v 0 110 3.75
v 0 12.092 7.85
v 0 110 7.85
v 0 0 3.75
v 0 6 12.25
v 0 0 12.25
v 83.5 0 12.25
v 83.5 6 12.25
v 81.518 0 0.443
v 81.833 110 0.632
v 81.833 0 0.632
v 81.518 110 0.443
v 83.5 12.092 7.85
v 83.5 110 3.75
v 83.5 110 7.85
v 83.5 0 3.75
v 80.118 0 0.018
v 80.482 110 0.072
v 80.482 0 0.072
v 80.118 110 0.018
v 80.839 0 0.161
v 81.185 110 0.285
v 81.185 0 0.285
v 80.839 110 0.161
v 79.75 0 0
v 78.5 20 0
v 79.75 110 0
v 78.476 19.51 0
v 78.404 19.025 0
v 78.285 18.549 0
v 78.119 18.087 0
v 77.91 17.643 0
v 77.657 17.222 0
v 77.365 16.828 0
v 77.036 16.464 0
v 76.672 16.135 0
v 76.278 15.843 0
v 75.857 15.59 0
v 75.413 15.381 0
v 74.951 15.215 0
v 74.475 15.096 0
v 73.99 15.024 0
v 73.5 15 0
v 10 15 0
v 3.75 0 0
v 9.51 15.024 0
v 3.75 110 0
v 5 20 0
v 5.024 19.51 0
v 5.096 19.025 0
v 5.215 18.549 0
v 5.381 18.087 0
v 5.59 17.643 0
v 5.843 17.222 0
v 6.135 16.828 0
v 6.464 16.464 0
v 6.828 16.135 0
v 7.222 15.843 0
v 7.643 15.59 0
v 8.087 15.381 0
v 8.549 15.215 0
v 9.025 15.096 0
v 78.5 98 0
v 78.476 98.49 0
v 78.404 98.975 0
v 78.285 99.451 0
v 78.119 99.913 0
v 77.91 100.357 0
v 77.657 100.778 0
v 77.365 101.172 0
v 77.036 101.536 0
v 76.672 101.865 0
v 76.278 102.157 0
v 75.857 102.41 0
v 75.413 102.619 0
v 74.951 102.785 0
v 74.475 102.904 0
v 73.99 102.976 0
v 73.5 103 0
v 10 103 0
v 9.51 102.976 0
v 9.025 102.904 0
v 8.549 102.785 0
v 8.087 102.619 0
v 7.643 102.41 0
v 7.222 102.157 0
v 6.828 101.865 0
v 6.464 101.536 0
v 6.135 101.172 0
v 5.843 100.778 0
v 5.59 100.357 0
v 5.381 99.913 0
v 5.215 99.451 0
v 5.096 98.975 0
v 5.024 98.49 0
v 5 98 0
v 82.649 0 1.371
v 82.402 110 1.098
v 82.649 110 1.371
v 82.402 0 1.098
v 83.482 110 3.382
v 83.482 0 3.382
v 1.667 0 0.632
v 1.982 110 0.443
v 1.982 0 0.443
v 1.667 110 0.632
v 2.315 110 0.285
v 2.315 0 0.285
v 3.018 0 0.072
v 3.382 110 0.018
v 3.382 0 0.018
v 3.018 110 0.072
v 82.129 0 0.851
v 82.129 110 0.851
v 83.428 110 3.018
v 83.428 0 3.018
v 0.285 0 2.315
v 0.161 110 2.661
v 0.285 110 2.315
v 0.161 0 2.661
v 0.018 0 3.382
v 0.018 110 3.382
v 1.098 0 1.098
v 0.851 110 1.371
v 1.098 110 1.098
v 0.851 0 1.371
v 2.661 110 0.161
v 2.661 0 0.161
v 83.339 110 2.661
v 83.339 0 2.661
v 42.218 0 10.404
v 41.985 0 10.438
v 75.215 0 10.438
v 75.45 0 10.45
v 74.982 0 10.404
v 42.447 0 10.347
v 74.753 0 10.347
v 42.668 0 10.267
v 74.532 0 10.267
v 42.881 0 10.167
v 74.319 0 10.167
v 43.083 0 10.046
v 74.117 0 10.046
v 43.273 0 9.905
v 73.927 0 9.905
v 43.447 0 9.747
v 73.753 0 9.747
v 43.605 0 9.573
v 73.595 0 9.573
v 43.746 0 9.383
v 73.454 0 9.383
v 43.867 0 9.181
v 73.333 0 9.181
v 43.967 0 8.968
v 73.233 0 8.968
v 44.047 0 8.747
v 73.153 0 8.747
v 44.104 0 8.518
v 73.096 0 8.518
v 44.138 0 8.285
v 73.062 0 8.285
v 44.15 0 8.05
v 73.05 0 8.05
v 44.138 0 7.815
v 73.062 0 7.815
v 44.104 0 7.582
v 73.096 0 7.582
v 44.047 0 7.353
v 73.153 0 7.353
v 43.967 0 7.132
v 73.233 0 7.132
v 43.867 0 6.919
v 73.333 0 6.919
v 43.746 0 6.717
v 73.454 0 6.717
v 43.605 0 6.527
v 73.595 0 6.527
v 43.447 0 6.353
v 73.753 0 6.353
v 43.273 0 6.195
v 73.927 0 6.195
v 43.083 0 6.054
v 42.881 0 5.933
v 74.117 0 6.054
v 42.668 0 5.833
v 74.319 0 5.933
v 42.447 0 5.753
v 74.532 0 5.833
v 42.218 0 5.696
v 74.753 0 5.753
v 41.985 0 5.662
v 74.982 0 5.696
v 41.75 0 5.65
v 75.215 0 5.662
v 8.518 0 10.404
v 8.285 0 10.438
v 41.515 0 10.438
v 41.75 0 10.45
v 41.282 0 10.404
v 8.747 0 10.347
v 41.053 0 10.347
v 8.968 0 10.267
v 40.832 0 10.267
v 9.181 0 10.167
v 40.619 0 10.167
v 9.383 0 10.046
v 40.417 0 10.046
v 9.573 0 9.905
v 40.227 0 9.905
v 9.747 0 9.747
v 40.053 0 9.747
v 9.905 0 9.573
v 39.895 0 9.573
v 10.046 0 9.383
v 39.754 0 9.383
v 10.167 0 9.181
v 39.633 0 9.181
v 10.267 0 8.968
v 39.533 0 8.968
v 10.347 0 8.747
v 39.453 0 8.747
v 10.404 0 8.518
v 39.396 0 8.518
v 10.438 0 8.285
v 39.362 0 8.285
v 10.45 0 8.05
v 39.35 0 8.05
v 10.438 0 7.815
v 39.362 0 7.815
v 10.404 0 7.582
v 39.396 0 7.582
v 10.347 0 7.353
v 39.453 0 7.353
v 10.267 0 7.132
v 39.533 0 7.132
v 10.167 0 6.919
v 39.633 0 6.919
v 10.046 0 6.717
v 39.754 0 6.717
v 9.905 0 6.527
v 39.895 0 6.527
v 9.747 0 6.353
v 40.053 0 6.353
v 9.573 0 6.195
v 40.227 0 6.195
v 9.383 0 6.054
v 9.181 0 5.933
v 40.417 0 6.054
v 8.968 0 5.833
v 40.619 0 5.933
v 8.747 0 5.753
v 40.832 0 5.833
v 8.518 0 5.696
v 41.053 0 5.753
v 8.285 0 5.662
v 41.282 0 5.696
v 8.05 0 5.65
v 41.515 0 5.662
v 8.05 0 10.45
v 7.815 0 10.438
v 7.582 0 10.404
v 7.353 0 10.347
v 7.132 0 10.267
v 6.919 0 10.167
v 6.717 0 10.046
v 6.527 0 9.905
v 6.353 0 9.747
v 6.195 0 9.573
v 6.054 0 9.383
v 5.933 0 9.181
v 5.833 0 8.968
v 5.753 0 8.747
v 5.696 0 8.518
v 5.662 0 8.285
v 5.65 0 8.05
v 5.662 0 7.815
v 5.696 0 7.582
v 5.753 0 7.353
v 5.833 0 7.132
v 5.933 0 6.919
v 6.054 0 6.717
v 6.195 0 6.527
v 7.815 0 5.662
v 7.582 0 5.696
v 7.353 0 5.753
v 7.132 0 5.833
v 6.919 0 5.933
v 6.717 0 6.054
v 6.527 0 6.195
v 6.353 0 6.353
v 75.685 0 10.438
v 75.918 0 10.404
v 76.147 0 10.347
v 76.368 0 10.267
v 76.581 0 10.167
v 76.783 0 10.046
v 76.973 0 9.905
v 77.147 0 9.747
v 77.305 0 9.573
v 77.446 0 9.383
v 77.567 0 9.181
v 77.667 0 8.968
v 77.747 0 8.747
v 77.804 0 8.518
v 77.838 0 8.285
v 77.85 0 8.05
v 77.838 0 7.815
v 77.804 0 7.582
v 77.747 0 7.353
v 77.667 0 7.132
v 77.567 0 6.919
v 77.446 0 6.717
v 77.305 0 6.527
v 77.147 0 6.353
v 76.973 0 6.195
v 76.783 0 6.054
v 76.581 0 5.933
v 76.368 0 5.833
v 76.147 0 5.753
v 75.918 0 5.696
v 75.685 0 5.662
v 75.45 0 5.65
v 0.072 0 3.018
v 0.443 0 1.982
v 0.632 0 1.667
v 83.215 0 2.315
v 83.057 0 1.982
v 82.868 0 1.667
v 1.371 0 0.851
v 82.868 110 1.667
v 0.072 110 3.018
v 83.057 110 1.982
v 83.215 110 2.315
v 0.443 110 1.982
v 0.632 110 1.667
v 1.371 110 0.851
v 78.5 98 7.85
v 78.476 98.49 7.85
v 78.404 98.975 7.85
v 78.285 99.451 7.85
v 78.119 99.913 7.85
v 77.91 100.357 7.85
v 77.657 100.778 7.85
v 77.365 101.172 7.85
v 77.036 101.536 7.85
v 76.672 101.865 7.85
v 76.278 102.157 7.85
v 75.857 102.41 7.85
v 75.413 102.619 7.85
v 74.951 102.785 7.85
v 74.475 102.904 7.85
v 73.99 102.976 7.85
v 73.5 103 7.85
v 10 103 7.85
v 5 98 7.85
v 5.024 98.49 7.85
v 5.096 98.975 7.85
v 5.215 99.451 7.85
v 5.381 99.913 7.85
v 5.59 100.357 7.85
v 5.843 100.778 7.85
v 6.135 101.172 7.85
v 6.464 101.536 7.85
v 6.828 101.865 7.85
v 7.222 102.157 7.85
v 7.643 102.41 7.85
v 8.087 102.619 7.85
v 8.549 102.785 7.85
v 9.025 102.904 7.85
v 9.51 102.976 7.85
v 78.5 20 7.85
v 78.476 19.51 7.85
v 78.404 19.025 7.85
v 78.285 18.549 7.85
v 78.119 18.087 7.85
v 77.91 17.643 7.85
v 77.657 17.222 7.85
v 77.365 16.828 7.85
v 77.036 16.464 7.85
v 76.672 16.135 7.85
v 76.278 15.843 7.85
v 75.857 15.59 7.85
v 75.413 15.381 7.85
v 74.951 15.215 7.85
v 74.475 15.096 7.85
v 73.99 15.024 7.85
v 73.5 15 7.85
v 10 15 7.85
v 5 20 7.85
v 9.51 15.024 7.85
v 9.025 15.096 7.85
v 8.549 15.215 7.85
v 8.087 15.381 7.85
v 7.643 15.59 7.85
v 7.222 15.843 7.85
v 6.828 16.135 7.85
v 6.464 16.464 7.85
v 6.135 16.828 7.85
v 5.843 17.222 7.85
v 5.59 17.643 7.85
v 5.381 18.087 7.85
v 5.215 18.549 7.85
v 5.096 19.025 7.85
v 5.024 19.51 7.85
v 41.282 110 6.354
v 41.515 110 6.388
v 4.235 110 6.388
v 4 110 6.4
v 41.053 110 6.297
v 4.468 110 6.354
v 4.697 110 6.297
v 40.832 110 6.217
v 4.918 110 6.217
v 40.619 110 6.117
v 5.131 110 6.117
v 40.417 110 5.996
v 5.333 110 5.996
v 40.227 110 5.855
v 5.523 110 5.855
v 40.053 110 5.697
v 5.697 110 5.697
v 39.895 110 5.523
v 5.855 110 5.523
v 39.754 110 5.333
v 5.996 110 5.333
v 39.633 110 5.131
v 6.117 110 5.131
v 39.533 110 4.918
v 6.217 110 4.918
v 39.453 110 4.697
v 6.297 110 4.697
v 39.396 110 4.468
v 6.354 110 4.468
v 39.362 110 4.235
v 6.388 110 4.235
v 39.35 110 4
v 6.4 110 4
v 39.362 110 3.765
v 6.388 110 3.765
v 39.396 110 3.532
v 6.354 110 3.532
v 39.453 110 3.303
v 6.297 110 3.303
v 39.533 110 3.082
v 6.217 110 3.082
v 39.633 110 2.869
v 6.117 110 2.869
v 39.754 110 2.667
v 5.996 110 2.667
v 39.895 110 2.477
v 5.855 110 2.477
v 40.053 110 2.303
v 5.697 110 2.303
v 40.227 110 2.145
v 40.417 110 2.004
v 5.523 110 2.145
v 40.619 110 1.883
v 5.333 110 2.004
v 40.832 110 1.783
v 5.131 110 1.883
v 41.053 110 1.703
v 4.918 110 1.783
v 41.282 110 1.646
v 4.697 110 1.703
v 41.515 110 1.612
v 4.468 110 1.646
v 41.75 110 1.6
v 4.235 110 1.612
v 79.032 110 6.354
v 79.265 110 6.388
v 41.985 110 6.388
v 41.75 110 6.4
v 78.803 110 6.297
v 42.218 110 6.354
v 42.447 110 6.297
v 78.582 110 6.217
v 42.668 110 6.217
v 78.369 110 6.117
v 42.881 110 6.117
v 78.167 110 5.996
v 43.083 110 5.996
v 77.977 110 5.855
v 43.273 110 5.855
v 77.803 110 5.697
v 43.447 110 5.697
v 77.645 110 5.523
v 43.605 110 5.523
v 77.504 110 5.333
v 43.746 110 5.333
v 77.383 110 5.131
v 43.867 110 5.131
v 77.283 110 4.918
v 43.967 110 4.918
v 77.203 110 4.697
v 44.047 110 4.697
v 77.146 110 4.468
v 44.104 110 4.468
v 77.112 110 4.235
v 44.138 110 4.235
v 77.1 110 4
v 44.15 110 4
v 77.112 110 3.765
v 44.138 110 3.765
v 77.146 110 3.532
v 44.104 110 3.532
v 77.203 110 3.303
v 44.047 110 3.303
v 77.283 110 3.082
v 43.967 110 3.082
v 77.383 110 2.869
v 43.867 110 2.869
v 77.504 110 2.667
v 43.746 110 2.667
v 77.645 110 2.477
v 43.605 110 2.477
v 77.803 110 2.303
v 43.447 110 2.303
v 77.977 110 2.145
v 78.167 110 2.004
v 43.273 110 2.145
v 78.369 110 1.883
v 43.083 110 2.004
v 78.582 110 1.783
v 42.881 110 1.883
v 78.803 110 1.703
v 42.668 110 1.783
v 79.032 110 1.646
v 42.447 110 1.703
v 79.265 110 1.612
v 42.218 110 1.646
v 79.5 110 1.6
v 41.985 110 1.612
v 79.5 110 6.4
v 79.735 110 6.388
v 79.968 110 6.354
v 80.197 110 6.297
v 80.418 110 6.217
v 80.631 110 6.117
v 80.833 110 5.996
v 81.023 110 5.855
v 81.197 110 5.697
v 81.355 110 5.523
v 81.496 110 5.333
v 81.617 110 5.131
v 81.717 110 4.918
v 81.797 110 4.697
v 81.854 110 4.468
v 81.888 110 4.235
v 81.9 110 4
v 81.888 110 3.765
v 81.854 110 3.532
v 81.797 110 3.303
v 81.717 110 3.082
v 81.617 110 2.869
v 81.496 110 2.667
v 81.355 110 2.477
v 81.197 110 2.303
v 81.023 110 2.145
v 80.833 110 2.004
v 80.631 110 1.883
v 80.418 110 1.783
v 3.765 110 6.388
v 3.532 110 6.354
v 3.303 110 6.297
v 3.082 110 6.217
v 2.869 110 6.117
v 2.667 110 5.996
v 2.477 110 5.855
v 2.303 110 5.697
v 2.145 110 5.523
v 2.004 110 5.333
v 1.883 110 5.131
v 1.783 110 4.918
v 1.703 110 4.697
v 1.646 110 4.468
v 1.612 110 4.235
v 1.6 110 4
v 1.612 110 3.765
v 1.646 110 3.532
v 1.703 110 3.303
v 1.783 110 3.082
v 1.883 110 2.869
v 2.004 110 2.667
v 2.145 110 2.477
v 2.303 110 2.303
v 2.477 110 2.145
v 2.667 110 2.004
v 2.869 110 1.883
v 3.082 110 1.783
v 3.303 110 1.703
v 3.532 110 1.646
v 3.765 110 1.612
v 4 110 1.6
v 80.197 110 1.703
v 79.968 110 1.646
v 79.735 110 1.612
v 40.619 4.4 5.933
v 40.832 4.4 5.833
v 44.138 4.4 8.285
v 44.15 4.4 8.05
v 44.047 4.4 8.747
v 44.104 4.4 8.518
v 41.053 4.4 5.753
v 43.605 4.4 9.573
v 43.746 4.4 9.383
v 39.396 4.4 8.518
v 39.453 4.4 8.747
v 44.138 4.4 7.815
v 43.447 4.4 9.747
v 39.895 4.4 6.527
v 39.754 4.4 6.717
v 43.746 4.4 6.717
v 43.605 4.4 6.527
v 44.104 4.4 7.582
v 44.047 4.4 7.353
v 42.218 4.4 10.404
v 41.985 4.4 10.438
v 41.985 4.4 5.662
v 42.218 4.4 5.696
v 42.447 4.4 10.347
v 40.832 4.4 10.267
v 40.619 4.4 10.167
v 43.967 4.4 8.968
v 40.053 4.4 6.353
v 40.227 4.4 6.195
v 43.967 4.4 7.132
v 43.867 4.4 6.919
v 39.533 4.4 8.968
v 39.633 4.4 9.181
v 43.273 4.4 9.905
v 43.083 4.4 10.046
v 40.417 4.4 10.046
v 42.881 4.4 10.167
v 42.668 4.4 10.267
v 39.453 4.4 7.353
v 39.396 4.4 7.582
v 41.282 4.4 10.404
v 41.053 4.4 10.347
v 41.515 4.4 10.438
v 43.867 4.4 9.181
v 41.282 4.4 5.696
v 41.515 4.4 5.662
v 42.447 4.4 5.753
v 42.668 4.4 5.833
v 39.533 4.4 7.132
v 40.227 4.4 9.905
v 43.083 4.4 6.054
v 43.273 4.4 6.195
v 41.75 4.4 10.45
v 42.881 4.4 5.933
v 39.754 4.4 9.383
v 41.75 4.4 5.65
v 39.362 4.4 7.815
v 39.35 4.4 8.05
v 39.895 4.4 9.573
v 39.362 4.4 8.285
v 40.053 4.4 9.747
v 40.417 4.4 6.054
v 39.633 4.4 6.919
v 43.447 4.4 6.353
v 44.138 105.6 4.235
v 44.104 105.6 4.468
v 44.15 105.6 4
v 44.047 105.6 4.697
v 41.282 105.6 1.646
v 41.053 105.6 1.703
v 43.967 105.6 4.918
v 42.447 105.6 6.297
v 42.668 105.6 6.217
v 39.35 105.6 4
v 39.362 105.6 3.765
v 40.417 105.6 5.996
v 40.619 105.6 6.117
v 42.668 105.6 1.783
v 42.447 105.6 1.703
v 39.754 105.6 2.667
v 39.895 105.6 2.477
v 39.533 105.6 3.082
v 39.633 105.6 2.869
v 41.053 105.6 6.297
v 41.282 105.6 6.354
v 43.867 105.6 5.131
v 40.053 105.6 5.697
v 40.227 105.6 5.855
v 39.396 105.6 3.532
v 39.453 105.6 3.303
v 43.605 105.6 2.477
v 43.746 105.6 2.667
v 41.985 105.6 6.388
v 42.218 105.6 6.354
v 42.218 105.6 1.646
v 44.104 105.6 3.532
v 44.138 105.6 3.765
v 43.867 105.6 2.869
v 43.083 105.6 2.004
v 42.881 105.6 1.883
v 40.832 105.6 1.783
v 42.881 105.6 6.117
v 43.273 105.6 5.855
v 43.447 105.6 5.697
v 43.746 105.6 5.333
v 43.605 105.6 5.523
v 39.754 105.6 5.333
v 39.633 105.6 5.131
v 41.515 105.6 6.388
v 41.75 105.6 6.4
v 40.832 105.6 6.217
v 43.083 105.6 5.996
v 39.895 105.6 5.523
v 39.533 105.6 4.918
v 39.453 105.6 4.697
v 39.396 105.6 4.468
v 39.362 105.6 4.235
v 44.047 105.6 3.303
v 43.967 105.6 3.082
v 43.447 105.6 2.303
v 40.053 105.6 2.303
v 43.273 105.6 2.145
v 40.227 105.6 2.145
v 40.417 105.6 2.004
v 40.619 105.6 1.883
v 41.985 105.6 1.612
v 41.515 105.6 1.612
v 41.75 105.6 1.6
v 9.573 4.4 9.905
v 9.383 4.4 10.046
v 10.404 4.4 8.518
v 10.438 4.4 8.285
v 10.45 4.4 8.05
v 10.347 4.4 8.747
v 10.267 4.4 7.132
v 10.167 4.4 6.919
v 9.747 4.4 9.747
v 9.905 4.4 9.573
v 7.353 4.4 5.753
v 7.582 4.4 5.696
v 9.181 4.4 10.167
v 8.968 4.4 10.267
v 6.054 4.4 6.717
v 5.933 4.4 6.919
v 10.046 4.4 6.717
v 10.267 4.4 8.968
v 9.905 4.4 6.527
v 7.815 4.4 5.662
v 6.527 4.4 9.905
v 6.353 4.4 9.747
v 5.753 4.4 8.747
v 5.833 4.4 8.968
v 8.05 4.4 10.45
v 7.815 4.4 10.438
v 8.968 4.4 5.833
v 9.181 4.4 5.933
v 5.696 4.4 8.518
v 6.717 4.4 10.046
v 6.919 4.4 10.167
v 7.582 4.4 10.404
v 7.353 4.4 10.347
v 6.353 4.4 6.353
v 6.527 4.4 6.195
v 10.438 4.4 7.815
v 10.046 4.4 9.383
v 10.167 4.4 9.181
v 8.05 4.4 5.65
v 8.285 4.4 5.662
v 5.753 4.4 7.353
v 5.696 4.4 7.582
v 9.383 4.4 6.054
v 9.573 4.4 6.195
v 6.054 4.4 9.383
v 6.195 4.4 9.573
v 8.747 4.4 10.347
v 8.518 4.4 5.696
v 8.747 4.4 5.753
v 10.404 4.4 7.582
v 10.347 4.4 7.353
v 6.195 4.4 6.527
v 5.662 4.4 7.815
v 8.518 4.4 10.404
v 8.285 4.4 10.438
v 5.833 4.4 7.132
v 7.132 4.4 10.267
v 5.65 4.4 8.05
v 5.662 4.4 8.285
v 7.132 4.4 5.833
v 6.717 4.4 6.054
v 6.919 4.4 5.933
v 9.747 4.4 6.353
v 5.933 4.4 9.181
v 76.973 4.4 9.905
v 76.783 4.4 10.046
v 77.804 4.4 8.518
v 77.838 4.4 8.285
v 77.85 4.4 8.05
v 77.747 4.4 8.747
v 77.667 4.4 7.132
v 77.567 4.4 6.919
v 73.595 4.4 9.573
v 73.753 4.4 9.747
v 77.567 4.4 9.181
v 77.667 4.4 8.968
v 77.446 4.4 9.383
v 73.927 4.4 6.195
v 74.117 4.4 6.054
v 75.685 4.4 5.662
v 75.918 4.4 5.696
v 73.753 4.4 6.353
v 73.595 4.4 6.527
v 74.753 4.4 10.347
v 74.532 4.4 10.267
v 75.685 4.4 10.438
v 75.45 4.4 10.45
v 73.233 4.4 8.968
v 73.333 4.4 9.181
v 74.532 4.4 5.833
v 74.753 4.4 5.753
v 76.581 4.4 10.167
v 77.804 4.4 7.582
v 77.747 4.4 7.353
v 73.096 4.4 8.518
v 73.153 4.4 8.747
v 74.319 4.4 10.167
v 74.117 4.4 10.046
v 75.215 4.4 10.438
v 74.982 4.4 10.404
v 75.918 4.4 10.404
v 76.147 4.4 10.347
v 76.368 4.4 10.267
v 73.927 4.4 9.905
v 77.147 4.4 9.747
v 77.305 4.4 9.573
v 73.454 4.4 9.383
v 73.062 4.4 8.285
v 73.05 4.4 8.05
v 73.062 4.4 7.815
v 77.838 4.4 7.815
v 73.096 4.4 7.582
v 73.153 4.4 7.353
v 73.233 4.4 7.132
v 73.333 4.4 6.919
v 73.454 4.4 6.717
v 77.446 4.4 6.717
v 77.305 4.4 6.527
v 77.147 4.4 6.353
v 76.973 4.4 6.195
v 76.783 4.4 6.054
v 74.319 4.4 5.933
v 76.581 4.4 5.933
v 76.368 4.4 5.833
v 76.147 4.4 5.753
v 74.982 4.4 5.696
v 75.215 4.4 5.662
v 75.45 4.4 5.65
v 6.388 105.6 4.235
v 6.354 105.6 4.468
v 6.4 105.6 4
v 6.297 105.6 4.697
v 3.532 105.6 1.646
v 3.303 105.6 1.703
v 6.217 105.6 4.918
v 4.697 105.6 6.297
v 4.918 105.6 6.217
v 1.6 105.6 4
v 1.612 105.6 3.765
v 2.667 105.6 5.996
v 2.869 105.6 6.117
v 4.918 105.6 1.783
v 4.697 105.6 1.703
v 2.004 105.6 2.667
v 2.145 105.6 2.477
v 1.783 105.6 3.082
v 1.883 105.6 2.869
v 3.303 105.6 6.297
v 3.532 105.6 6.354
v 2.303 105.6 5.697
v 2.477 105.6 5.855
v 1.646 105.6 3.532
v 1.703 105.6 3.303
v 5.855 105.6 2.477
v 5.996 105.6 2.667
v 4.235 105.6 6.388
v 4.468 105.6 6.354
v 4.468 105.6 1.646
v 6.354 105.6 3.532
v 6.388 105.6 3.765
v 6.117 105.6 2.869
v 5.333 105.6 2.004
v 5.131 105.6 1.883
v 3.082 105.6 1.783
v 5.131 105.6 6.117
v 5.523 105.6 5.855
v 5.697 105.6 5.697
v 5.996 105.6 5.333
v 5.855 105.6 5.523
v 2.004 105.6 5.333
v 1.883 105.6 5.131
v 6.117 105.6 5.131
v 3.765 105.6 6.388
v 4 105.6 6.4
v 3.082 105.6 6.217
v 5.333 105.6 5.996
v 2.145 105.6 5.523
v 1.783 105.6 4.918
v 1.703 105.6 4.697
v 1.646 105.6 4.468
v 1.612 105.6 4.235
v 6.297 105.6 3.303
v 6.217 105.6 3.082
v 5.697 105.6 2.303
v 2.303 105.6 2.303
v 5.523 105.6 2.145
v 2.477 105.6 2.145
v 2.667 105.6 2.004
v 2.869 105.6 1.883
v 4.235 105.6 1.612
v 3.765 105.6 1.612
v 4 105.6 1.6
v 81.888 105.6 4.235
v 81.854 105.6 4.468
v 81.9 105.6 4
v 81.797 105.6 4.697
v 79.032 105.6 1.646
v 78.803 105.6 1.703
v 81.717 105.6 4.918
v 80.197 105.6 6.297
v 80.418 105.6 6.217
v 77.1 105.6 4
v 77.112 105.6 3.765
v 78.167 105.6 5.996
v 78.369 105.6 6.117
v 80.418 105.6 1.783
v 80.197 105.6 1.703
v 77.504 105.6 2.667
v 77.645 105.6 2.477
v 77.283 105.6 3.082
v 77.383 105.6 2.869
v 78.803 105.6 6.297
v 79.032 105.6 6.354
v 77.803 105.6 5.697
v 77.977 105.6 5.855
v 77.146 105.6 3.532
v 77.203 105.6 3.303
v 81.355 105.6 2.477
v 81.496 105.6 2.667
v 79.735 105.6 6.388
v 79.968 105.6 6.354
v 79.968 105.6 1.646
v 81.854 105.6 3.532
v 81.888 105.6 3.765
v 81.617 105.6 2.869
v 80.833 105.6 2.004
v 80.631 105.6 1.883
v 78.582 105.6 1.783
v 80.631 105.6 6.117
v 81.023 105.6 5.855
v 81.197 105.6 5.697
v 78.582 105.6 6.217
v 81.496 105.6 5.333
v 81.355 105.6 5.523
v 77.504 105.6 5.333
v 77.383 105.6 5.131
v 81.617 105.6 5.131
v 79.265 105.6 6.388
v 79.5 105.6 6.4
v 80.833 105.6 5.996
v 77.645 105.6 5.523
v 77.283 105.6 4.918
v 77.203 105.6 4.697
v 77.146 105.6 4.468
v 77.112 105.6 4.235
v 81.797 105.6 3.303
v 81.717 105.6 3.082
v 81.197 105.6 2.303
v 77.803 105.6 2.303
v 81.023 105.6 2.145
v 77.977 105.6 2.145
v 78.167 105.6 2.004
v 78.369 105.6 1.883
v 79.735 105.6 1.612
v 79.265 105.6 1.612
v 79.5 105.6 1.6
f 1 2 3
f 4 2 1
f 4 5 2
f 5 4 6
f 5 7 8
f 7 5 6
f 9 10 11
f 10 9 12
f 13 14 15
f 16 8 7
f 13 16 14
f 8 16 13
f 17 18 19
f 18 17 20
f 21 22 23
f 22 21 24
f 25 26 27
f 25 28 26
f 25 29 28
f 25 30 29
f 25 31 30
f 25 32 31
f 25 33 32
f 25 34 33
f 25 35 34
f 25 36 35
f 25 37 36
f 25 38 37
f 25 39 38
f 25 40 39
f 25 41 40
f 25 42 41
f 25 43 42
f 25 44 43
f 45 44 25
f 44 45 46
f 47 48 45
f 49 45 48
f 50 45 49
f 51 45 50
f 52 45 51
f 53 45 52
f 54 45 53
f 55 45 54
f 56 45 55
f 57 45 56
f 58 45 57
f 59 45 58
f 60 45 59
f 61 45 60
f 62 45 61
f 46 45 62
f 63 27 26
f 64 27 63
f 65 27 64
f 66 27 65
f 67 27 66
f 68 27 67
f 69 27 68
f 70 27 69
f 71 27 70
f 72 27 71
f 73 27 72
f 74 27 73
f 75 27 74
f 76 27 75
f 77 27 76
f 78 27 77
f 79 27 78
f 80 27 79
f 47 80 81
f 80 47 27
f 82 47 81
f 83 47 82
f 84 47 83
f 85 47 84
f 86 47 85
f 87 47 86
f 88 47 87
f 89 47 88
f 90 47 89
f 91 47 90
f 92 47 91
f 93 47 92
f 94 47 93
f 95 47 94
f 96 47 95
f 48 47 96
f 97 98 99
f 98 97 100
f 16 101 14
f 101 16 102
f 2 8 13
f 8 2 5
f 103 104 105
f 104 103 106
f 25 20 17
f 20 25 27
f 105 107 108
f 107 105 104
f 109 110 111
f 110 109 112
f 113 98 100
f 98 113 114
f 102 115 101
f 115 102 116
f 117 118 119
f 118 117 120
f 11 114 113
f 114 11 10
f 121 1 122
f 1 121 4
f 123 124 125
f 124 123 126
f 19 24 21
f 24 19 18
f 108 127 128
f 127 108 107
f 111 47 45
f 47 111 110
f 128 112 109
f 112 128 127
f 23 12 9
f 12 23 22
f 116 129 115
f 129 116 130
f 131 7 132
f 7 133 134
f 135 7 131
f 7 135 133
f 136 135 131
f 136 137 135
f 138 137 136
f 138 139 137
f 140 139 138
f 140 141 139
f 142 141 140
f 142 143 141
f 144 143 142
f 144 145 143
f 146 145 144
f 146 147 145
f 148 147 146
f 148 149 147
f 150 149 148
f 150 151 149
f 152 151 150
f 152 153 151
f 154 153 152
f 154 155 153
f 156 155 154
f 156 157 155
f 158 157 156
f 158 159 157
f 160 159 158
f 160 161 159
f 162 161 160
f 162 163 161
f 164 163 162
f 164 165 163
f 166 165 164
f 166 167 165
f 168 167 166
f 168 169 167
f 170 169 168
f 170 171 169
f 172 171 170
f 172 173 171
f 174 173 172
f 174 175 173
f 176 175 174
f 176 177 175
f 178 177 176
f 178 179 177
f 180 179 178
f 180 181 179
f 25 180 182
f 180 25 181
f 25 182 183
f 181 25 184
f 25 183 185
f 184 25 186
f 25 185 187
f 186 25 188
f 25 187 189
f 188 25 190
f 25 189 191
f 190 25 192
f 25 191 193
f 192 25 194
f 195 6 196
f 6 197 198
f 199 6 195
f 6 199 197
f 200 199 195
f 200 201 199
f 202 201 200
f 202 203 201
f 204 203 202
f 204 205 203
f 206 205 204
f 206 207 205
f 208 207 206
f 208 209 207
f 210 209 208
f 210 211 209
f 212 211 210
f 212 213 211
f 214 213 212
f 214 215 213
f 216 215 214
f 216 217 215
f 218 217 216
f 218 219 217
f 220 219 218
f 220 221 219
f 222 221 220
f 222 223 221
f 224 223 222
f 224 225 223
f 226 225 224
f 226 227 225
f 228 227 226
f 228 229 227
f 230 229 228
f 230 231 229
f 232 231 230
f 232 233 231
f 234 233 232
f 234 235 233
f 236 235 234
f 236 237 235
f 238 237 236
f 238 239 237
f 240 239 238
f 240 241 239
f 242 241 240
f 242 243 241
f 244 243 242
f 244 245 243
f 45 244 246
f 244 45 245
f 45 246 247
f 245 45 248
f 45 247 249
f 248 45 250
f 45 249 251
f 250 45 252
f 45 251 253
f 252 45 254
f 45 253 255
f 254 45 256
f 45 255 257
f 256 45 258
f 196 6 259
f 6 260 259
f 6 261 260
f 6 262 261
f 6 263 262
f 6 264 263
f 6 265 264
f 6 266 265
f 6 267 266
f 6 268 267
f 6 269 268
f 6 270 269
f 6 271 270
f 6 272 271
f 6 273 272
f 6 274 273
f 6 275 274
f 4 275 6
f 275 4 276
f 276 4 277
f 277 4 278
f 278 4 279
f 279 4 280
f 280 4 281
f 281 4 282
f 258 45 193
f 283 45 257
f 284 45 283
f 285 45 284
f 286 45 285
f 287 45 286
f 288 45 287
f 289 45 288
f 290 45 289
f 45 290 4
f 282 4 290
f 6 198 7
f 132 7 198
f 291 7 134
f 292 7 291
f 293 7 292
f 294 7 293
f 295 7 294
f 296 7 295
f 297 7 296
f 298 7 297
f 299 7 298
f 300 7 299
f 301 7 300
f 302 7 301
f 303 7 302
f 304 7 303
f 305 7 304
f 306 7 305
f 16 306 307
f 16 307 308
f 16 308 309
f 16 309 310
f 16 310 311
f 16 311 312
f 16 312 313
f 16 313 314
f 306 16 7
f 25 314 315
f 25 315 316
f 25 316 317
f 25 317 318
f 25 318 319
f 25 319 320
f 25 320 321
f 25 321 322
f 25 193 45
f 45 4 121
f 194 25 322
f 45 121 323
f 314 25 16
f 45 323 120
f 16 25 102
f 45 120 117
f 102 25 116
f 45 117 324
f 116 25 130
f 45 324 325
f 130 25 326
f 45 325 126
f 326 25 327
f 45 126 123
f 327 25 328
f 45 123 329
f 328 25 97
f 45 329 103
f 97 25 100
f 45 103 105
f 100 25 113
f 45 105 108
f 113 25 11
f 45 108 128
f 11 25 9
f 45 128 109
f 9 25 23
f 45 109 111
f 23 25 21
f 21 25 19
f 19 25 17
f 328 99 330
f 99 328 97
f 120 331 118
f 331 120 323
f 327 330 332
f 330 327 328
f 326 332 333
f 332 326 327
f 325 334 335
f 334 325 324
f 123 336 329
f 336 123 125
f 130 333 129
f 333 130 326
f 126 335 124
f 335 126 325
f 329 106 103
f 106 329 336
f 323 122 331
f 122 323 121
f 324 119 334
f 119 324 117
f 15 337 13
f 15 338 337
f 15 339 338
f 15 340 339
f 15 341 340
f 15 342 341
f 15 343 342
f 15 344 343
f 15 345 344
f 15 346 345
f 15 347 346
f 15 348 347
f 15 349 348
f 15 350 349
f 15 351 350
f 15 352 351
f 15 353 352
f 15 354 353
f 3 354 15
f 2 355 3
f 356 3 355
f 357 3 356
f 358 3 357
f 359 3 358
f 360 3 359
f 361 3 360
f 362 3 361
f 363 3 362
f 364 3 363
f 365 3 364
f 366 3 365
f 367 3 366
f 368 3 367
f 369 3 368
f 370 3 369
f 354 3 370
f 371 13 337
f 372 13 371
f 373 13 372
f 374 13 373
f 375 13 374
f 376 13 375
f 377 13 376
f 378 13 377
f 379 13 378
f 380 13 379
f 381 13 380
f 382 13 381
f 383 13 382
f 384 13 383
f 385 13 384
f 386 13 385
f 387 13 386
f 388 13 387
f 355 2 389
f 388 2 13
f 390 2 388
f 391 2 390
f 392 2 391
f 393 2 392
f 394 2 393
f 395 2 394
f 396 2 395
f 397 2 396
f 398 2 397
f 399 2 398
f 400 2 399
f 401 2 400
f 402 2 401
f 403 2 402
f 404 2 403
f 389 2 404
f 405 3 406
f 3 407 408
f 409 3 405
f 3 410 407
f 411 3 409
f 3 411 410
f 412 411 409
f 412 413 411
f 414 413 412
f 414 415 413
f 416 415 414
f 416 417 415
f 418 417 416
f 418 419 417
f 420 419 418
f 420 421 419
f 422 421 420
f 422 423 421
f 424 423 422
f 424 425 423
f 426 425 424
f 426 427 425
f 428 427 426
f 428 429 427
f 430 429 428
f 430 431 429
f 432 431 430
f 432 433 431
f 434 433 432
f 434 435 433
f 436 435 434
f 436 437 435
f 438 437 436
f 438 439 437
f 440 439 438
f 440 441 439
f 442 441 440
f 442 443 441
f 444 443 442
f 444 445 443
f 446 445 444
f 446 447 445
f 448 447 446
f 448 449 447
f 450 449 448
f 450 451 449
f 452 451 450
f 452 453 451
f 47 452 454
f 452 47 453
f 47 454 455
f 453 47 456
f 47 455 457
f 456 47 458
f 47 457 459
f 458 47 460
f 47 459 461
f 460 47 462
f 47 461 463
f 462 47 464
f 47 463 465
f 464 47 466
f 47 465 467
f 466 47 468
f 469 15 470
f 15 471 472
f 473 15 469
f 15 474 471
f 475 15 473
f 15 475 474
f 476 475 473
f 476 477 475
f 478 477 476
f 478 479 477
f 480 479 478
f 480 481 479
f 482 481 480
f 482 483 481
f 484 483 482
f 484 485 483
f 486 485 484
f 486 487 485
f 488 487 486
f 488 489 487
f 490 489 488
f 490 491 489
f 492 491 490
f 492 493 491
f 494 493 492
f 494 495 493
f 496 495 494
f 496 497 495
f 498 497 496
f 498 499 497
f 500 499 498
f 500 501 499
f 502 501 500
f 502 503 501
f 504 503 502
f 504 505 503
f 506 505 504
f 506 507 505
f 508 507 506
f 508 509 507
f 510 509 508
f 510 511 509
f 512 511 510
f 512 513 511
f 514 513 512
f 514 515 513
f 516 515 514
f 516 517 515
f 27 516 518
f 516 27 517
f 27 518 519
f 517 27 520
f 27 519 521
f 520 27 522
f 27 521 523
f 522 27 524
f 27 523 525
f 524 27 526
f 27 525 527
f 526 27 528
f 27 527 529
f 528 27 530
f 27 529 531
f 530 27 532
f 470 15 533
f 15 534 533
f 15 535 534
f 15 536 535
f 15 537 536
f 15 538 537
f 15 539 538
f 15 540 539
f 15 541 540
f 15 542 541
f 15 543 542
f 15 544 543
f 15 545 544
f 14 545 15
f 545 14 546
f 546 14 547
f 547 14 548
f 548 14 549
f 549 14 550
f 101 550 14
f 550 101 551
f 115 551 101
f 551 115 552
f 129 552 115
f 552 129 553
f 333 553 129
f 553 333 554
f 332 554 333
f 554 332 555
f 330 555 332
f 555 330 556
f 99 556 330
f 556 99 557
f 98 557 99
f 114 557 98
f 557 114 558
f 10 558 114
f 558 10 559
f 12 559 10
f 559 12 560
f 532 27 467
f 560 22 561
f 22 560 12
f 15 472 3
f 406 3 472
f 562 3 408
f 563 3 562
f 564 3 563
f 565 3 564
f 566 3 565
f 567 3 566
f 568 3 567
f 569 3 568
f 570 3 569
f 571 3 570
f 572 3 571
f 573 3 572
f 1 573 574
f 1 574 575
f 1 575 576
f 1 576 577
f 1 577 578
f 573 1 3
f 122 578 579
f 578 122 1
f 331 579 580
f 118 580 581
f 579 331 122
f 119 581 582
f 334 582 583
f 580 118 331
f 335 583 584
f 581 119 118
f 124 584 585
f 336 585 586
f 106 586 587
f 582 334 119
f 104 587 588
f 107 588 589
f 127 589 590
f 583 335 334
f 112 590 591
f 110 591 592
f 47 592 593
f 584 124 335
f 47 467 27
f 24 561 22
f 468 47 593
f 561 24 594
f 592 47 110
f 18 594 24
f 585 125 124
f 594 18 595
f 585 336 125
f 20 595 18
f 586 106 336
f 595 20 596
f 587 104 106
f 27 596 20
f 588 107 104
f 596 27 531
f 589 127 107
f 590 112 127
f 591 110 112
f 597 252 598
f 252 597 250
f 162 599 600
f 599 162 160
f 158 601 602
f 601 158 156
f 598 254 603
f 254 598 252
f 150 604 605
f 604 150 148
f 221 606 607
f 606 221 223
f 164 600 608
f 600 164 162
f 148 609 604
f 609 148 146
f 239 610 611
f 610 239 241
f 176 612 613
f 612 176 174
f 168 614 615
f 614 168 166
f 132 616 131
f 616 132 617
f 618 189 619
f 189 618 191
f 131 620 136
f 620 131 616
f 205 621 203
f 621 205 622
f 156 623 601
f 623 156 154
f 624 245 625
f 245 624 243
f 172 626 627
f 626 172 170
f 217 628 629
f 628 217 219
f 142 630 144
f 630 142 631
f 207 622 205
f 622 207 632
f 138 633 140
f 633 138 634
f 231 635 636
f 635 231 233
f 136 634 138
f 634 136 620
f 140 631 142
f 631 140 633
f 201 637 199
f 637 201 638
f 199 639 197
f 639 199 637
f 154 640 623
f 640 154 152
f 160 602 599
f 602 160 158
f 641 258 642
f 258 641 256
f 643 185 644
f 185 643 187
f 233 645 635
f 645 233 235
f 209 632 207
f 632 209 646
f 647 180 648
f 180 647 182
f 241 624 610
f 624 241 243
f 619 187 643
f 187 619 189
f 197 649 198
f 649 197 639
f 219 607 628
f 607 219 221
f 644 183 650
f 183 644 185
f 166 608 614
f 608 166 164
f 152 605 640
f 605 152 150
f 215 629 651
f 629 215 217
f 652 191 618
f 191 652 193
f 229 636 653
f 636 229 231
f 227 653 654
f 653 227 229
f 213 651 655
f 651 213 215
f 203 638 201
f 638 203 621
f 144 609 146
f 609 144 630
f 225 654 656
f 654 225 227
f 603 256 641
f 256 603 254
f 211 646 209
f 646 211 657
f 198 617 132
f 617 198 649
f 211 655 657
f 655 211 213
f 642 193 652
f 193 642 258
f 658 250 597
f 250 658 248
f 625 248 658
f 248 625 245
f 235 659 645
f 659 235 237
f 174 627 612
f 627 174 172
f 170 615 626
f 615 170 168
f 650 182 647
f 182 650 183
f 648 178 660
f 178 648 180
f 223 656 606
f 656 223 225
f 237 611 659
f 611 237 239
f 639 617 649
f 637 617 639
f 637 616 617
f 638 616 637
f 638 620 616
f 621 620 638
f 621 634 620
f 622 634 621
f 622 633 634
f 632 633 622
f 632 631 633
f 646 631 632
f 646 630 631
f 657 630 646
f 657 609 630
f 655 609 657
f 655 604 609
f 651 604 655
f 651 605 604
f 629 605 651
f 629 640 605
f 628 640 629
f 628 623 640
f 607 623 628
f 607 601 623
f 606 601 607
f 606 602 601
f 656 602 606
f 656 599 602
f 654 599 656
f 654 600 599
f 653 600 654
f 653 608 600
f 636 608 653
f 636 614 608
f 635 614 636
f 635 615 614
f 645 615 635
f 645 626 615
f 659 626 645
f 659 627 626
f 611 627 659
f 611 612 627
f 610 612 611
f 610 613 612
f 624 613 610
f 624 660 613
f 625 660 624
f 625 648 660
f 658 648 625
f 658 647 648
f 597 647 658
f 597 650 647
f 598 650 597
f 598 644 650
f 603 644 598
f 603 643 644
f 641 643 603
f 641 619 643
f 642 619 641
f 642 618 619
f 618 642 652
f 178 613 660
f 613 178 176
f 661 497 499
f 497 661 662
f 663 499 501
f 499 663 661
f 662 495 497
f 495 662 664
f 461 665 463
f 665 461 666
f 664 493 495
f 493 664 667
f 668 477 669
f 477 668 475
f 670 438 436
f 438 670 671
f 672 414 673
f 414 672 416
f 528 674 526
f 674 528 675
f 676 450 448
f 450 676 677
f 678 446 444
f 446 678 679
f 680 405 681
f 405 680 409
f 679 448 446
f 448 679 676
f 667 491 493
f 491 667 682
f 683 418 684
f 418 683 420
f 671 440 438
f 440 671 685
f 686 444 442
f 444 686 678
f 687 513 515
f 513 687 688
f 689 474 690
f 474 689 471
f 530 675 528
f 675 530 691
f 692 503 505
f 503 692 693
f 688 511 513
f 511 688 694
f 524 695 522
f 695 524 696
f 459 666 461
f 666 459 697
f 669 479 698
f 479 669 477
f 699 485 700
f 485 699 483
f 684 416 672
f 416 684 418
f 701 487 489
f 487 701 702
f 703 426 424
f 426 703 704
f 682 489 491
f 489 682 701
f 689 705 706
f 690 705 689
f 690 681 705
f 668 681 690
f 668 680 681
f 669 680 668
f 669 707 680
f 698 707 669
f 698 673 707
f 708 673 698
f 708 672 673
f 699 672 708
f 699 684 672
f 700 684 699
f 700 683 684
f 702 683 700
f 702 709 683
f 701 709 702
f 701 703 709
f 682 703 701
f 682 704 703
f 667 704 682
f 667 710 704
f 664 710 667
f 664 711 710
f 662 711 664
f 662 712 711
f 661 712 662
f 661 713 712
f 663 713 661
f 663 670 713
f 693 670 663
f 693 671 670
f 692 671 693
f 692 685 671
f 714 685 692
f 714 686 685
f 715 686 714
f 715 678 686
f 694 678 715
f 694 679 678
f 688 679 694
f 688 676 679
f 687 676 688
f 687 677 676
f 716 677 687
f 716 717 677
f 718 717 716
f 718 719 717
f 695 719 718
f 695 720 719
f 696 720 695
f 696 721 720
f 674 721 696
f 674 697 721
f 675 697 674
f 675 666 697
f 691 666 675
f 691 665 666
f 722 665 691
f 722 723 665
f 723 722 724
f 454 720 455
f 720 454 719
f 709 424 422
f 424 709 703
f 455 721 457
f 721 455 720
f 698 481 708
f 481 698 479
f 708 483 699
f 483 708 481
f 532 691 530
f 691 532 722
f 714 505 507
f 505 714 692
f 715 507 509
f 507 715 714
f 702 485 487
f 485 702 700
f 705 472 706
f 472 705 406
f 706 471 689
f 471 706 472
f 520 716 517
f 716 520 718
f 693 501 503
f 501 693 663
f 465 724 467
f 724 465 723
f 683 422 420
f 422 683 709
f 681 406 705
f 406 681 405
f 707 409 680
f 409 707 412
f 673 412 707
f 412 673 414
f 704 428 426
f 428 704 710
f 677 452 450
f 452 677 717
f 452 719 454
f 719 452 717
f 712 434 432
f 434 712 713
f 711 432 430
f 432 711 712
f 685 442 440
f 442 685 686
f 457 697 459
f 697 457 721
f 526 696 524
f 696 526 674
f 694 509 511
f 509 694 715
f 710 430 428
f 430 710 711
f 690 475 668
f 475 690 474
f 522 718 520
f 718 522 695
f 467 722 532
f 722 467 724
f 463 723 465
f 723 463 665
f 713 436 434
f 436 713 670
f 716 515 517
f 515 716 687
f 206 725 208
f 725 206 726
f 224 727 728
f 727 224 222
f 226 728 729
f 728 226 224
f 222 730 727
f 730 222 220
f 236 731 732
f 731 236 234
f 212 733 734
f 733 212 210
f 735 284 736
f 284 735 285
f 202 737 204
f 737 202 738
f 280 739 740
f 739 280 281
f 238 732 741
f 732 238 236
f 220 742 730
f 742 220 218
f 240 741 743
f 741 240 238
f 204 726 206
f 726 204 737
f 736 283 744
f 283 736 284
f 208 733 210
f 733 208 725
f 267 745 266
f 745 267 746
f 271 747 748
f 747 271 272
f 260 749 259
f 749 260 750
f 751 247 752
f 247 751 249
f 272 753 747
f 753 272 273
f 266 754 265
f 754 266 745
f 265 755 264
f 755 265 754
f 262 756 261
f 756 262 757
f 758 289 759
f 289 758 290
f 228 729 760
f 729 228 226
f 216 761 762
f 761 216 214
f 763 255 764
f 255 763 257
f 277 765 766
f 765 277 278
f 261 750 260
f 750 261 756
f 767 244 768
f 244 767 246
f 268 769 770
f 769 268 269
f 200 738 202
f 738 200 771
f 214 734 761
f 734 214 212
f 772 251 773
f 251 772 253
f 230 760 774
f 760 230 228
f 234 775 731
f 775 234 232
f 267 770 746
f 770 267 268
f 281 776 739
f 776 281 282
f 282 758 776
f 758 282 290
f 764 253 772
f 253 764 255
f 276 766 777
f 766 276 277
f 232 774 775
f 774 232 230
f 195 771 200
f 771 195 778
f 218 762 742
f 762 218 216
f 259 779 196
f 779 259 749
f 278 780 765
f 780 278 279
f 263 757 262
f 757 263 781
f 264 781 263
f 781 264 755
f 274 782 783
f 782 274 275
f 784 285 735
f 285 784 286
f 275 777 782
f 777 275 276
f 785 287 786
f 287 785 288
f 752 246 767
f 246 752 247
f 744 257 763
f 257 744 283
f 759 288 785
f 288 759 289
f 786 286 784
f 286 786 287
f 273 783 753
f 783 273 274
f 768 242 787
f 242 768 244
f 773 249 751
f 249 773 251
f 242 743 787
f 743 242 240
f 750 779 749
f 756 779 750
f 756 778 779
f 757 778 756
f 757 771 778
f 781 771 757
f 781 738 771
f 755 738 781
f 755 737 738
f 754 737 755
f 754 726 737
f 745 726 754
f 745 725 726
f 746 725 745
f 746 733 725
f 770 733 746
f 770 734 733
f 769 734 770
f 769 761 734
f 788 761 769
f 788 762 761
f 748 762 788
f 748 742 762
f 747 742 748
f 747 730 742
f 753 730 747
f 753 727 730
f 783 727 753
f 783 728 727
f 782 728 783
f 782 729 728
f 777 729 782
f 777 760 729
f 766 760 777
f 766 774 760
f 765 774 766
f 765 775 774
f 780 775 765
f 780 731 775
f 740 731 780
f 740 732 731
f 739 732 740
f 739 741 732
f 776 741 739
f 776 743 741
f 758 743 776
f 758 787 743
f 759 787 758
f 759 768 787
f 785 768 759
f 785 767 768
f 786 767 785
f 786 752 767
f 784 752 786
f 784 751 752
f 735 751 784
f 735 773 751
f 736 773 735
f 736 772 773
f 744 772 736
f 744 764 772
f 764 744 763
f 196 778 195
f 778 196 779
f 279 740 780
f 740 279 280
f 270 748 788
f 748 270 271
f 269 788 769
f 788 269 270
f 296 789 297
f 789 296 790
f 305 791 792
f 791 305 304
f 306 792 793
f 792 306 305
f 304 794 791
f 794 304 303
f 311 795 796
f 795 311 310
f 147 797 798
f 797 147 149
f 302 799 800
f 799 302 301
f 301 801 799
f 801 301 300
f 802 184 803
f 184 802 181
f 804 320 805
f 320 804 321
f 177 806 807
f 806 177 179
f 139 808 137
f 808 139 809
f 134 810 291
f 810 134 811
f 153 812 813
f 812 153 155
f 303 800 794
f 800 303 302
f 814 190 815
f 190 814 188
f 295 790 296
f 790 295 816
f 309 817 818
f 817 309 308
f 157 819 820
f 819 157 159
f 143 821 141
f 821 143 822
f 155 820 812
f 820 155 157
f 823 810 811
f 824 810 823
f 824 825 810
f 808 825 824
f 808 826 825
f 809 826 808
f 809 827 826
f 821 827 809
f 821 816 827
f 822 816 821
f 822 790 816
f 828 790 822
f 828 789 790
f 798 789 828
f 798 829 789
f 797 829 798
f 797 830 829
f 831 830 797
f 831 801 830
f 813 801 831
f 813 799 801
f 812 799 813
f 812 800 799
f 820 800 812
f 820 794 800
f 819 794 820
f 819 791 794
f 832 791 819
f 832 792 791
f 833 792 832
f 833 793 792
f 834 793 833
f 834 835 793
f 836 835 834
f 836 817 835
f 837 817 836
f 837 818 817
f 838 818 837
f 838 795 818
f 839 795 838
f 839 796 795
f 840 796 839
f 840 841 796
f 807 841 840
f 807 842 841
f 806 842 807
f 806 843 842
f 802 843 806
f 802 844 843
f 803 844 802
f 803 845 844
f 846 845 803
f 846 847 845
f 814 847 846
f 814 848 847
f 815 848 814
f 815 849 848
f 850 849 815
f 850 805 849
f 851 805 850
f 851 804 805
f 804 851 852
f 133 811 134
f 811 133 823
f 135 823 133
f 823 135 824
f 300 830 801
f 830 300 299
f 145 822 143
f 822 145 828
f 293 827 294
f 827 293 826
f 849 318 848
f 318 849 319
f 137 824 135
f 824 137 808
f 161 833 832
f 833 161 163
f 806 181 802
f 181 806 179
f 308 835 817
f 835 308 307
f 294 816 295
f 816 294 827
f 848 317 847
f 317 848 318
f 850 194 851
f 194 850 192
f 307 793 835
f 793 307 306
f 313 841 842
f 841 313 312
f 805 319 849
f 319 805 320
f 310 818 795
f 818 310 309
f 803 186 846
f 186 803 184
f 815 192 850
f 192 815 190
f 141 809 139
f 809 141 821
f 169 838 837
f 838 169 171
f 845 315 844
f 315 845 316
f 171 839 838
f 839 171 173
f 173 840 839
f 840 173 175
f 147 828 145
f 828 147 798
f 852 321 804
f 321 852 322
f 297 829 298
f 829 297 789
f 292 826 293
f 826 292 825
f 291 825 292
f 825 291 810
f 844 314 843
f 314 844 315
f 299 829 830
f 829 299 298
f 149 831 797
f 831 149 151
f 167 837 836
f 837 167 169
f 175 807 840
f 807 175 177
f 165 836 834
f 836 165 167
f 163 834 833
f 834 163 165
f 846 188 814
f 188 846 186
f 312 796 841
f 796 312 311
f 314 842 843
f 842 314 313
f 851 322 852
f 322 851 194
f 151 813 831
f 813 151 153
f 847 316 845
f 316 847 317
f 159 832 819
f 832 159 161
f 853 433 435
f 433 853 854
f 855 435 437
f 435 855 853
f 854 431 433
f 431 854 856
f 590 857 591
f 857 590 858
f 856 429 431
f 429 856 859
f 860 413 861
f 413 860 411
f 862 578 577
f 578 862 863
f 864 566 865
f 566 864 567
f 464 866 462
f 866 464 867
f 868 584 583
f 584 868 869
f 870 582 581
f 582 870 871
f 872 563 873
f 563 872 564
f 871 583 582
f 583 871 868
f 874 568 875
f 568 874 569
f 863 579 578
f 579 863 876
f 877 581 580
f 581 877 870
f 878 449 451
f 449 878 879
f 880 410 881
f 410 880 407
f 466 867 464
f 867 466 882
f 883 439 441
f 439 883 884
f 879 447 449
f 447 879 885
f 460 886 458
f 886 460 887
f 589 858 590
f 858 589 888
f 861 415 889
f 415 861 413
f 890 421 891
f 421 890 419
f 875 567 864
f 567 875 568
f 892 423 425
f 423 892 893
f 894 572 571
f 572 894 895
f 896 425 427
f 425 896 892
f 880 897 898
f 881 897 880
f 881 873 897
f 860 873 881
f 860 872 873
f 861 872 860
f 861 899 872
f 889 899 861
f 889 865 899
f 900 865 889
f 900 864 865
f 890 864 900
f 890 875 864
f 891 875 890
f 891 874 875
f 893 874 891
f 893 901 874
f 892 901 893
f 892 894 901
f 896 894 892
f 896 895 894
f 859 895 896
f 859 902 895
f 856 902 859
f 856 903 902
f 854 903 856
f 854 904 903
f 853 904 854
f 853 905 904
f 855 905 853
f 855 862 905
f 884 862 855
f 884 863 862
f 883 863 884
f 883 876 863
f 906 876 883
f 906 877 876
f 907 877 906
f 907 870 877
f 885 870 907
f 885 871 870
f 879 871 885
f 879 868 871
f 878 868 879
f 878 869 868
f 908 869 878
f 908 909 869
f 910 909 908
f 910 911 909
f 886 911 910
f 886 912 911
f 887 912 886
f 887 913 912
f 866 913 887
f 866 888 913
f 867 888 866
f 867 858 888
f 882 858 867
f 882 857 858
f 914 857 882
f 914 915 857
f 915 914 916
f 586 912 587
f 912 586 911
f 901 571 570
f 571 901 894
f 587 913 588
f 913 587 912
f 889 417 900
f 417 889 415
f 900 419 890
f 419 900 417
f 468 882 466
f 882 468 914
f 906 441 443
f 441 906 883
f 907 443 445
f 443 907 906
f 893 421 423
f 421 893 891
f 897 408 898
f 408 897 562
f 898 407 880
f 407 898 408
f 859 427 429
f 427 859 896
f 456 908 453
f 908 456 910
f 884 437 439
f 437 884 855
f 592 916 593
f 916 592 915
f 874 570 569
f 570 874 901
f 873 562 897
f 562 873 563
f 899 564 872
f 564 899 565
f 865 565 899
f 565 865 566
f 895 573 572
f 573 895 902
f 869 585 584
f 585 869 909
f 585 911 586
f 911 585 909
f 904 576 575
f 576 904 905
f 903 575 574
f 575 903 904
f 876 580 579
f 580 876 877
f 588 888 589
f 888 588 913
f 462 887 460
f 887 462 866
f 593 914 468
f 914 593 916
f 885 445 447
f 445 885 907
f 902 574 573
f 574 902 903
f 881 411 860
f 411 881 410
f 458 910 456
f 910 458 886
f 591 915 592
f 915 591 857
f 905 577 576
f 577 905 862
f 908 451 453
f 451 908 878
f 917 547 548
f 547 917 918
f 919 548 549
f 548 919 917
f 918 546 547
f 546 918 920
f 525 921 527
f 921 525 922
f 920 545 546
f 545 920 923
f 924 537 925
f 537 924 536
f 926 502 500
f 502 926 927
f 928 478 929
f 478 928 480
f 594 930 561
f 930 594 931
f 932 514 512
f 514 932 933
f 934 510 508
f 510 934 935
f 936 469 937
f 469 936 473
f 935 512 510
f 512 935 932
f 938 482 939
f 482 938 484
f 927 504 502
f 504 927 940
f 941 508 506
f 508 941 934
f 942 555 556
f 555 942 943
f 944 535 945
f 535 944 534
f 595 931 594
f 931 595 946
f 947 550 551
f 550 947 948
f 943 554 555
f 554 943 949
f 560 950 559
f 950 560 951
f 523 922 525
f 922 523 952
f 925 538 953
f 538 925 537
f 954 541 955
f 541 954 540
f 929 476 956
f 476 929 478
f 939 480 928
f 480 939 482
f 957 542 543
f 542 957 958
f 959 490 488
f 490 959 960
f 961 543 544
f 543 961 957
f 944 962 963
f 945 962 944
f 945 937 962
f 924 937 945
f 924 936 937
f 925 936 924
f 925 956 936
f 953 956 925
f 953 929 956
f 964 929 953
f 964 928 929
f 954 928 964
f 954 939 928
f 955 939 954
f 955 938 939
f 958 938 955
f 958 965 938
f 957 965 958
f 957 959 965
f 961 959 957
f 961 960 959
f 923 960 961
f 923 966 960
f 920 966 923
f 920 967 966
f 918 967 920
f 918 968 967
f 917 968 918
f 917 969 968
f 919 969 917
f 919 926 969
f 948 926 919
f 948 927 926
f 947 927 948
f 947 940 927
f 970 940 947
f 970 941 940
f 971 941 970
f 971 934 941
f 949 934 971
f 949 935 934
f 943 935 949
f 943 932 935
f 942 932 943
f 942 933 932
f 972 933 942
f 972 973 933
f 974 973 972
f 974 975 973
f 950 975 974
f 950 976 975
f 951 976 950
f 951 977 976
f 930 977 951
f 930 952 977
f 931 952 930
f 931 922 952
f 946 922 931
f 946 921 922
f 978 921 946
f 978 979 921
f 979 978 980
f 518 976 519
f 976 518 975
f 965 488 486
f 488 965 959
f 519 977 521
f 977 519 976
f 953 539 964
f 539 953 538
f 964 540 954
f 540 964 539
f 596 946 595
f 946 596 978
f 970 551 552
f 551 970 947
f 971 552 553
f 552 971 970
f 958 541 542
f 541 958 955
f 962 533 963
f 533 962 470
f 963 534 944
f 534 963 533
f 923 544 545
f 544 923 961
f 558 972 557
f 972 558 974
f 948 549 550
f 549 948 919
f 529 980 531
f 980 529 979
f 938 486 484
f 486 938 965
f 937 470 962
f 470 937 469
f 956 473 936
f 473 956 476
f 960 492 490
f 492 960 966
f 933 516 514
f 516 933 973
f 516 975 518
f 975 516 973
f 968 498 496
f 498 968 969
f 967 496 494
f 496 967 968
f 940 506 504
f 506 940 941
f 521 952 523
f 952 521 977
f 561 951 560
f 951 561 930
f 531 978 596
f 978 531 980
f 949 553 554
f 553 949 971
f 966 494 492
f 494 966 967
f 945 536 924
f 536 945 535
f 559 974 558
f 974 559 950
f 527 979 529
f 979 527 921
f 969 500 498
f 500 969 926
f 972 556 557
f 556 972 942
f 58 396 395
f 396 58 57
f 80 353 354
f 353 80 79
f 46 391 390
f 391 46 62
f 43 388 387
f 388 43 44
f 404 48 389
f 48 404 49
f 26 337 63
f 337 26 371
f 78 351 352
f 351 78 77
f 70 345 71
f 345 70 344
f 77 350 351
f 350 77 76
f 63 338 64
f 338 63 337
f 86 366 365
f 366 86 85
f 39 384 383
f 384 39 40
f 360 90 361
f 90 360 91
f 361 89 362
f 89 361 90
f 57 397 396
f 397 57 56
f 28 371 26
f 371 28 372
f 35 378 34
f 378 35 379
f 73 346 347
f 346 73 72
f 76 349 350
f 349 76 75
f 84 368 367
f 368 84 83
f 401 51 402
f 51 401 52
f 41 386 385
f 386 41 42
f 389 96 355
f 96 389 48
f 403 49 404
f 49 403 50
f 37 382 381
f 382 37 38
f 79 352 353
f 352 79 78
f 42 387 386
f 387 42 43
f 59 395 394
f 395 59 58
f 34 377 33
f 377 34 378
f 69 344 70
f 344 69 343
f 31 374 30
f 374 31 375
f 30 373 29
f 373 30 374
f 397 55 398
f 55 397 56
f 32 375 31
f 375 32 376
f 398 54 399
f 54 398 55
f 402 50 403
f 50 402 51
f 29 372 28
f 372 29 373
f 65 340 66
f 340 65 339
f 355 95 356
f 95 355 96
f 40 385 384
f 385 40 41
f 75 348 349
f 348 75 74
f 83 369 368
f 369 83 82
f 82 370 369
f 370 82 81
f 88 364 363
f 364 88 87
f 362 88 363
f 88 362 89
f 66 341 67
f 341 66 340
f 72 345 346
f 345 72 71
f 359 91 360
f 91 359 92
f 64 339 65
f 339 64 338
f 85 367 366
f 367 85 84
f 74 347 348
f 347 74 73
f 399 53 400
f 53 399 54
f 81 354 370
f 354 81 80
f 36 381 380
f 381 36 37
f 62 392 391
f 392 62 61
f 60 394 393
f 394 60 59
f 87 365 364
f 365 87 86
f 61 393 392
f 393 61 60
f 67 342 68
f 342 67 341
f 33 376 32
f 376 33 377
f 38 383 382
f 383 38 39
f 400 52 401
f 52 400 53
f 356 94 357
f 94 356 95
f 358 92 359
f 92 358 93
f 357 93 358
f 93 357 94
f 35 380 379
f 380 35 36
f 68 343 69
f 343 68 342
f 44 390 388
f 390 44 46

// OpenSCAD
//Designed for M3 heat melt inserts, 5mm diameter, 4mm depth


$fn=64;
depth_u = 2;
height_mm = 110;

hole_d = 4.5;
hole_r = 2.4;

save_filament = true;
sidewall_mm = 10;
top_mm = 12;

difference(){
//cube([(depth_u*42)-0.5,height_mm,6]);
union(){
 hull(){ //base portion
    translate([0,0,3.75]) cube([(depth_u*42)-0.5,6,8.5]); //Upper cube
    translate([3.75,0,3.75]) rotate([-90,0,0]) cylinder(h=10, r=3.75);
    translate([depth_u*42-3.75-.5,0,3.75]) rotate([-90,0,0]) cylinder(h=10, r=3.75);
    translate([0,13,3.75]) cube([(depth_u*42)-0.5,2,2]); //Middle cube
    //translate([0,height_mm-2,3.75]) cube([(depth_u*42)-0.5,2,4]); //Upper cube
    

    //translate([0,height_mm,12]) rotate([90,0,0]) cylinder(h=hole_d, r=hole_r);
    //translate([12,height_mm,12]) rotate([90,0,0]) cylinder(h=hole_d, r=hole_r);

    //translate([0,height_mm,0]) rotate([90,0,0]) cylinder(h=hole_d, r=hole_r);
    //translate([12,height_mm,12]) rotate([90,0,0]) cylinder(h=hole_d, r=hole_r);
//
 }
 hull(){ //vertical extension
    translate([0,12,3.75]) cube([(depth_u*42)-0.5,2,4.1]); //Middle cube
    translate([0,height_mm-2,3.75]) cube([(depth_u*42)-0.5,2,4.1]); //Upper cube
    translate([3.75,0,3.75]) rotate([-90,0,0]) cylinder(h=height_mm, r=3.75);
    translate([depth_u*42-3.75-.5,0,3.75]) rotate([-90,0,0]) cylinder(h=height_mm, r=3.75);
    } 
}// end union
    
translate([8.05,hole_d-0.1,8.05]) rotate([90,0,0]) cylinder(h=hole_d, r=hole_r); //bottom left hole
translate([((depth_u)*42)-8.55,hole_d-0.1,8.05]) rotate([90,0,0]) cylinder(h=hole_d, r=hole_r); //bottom right hole

// middle screw holes
if(depth_u>1)
{
translate([(((depth_u)*42)/2)-0.25,hole_d-0.1,8.05]) rotate([90,0,0]) cylinder(h=hole_d, r=hole_r); //bottom middle hole
translate([(((depth_u)*42)/2)-0.25,(height_mm)+0.1,4]) rotate([90,0,0]) cylinder(h=hole_d, r=hole_r); //top middle hole
}

translate([4,(height_mm)+0.1,4]) rotate([90,0,0]) cylinder(h=hole_d, r=hole_r); //top left hole
translate([((depth_u)*42)-4.5,(height_mm)+0.1,4]) rotate([90,0,0]) cylinder(h=hole_d, r=hole_r); //top right hole

if(save_filament){
hull(){
    translate([sidewall_mm,20,-0.01]) cylinder(h=20,r=5);
    translate([sidewall_mm,height_mm-top_mm,-0.01]) cylinder(h=20,r=5);
    translate([((depth_u)*42)-sidewall_mm-.5,20,-0.01]) cylinder(h=20,r=5);
    translate([((depth_u)*42)-sidewall_mm-.5,height_mm-top_mm,-0.01]) cylinder(h=20,r=5);
    }
    }

} //end difference

//Notes
/*
Need to be 17mm in form the perimated on the bottom for the screws to come in 

*/
